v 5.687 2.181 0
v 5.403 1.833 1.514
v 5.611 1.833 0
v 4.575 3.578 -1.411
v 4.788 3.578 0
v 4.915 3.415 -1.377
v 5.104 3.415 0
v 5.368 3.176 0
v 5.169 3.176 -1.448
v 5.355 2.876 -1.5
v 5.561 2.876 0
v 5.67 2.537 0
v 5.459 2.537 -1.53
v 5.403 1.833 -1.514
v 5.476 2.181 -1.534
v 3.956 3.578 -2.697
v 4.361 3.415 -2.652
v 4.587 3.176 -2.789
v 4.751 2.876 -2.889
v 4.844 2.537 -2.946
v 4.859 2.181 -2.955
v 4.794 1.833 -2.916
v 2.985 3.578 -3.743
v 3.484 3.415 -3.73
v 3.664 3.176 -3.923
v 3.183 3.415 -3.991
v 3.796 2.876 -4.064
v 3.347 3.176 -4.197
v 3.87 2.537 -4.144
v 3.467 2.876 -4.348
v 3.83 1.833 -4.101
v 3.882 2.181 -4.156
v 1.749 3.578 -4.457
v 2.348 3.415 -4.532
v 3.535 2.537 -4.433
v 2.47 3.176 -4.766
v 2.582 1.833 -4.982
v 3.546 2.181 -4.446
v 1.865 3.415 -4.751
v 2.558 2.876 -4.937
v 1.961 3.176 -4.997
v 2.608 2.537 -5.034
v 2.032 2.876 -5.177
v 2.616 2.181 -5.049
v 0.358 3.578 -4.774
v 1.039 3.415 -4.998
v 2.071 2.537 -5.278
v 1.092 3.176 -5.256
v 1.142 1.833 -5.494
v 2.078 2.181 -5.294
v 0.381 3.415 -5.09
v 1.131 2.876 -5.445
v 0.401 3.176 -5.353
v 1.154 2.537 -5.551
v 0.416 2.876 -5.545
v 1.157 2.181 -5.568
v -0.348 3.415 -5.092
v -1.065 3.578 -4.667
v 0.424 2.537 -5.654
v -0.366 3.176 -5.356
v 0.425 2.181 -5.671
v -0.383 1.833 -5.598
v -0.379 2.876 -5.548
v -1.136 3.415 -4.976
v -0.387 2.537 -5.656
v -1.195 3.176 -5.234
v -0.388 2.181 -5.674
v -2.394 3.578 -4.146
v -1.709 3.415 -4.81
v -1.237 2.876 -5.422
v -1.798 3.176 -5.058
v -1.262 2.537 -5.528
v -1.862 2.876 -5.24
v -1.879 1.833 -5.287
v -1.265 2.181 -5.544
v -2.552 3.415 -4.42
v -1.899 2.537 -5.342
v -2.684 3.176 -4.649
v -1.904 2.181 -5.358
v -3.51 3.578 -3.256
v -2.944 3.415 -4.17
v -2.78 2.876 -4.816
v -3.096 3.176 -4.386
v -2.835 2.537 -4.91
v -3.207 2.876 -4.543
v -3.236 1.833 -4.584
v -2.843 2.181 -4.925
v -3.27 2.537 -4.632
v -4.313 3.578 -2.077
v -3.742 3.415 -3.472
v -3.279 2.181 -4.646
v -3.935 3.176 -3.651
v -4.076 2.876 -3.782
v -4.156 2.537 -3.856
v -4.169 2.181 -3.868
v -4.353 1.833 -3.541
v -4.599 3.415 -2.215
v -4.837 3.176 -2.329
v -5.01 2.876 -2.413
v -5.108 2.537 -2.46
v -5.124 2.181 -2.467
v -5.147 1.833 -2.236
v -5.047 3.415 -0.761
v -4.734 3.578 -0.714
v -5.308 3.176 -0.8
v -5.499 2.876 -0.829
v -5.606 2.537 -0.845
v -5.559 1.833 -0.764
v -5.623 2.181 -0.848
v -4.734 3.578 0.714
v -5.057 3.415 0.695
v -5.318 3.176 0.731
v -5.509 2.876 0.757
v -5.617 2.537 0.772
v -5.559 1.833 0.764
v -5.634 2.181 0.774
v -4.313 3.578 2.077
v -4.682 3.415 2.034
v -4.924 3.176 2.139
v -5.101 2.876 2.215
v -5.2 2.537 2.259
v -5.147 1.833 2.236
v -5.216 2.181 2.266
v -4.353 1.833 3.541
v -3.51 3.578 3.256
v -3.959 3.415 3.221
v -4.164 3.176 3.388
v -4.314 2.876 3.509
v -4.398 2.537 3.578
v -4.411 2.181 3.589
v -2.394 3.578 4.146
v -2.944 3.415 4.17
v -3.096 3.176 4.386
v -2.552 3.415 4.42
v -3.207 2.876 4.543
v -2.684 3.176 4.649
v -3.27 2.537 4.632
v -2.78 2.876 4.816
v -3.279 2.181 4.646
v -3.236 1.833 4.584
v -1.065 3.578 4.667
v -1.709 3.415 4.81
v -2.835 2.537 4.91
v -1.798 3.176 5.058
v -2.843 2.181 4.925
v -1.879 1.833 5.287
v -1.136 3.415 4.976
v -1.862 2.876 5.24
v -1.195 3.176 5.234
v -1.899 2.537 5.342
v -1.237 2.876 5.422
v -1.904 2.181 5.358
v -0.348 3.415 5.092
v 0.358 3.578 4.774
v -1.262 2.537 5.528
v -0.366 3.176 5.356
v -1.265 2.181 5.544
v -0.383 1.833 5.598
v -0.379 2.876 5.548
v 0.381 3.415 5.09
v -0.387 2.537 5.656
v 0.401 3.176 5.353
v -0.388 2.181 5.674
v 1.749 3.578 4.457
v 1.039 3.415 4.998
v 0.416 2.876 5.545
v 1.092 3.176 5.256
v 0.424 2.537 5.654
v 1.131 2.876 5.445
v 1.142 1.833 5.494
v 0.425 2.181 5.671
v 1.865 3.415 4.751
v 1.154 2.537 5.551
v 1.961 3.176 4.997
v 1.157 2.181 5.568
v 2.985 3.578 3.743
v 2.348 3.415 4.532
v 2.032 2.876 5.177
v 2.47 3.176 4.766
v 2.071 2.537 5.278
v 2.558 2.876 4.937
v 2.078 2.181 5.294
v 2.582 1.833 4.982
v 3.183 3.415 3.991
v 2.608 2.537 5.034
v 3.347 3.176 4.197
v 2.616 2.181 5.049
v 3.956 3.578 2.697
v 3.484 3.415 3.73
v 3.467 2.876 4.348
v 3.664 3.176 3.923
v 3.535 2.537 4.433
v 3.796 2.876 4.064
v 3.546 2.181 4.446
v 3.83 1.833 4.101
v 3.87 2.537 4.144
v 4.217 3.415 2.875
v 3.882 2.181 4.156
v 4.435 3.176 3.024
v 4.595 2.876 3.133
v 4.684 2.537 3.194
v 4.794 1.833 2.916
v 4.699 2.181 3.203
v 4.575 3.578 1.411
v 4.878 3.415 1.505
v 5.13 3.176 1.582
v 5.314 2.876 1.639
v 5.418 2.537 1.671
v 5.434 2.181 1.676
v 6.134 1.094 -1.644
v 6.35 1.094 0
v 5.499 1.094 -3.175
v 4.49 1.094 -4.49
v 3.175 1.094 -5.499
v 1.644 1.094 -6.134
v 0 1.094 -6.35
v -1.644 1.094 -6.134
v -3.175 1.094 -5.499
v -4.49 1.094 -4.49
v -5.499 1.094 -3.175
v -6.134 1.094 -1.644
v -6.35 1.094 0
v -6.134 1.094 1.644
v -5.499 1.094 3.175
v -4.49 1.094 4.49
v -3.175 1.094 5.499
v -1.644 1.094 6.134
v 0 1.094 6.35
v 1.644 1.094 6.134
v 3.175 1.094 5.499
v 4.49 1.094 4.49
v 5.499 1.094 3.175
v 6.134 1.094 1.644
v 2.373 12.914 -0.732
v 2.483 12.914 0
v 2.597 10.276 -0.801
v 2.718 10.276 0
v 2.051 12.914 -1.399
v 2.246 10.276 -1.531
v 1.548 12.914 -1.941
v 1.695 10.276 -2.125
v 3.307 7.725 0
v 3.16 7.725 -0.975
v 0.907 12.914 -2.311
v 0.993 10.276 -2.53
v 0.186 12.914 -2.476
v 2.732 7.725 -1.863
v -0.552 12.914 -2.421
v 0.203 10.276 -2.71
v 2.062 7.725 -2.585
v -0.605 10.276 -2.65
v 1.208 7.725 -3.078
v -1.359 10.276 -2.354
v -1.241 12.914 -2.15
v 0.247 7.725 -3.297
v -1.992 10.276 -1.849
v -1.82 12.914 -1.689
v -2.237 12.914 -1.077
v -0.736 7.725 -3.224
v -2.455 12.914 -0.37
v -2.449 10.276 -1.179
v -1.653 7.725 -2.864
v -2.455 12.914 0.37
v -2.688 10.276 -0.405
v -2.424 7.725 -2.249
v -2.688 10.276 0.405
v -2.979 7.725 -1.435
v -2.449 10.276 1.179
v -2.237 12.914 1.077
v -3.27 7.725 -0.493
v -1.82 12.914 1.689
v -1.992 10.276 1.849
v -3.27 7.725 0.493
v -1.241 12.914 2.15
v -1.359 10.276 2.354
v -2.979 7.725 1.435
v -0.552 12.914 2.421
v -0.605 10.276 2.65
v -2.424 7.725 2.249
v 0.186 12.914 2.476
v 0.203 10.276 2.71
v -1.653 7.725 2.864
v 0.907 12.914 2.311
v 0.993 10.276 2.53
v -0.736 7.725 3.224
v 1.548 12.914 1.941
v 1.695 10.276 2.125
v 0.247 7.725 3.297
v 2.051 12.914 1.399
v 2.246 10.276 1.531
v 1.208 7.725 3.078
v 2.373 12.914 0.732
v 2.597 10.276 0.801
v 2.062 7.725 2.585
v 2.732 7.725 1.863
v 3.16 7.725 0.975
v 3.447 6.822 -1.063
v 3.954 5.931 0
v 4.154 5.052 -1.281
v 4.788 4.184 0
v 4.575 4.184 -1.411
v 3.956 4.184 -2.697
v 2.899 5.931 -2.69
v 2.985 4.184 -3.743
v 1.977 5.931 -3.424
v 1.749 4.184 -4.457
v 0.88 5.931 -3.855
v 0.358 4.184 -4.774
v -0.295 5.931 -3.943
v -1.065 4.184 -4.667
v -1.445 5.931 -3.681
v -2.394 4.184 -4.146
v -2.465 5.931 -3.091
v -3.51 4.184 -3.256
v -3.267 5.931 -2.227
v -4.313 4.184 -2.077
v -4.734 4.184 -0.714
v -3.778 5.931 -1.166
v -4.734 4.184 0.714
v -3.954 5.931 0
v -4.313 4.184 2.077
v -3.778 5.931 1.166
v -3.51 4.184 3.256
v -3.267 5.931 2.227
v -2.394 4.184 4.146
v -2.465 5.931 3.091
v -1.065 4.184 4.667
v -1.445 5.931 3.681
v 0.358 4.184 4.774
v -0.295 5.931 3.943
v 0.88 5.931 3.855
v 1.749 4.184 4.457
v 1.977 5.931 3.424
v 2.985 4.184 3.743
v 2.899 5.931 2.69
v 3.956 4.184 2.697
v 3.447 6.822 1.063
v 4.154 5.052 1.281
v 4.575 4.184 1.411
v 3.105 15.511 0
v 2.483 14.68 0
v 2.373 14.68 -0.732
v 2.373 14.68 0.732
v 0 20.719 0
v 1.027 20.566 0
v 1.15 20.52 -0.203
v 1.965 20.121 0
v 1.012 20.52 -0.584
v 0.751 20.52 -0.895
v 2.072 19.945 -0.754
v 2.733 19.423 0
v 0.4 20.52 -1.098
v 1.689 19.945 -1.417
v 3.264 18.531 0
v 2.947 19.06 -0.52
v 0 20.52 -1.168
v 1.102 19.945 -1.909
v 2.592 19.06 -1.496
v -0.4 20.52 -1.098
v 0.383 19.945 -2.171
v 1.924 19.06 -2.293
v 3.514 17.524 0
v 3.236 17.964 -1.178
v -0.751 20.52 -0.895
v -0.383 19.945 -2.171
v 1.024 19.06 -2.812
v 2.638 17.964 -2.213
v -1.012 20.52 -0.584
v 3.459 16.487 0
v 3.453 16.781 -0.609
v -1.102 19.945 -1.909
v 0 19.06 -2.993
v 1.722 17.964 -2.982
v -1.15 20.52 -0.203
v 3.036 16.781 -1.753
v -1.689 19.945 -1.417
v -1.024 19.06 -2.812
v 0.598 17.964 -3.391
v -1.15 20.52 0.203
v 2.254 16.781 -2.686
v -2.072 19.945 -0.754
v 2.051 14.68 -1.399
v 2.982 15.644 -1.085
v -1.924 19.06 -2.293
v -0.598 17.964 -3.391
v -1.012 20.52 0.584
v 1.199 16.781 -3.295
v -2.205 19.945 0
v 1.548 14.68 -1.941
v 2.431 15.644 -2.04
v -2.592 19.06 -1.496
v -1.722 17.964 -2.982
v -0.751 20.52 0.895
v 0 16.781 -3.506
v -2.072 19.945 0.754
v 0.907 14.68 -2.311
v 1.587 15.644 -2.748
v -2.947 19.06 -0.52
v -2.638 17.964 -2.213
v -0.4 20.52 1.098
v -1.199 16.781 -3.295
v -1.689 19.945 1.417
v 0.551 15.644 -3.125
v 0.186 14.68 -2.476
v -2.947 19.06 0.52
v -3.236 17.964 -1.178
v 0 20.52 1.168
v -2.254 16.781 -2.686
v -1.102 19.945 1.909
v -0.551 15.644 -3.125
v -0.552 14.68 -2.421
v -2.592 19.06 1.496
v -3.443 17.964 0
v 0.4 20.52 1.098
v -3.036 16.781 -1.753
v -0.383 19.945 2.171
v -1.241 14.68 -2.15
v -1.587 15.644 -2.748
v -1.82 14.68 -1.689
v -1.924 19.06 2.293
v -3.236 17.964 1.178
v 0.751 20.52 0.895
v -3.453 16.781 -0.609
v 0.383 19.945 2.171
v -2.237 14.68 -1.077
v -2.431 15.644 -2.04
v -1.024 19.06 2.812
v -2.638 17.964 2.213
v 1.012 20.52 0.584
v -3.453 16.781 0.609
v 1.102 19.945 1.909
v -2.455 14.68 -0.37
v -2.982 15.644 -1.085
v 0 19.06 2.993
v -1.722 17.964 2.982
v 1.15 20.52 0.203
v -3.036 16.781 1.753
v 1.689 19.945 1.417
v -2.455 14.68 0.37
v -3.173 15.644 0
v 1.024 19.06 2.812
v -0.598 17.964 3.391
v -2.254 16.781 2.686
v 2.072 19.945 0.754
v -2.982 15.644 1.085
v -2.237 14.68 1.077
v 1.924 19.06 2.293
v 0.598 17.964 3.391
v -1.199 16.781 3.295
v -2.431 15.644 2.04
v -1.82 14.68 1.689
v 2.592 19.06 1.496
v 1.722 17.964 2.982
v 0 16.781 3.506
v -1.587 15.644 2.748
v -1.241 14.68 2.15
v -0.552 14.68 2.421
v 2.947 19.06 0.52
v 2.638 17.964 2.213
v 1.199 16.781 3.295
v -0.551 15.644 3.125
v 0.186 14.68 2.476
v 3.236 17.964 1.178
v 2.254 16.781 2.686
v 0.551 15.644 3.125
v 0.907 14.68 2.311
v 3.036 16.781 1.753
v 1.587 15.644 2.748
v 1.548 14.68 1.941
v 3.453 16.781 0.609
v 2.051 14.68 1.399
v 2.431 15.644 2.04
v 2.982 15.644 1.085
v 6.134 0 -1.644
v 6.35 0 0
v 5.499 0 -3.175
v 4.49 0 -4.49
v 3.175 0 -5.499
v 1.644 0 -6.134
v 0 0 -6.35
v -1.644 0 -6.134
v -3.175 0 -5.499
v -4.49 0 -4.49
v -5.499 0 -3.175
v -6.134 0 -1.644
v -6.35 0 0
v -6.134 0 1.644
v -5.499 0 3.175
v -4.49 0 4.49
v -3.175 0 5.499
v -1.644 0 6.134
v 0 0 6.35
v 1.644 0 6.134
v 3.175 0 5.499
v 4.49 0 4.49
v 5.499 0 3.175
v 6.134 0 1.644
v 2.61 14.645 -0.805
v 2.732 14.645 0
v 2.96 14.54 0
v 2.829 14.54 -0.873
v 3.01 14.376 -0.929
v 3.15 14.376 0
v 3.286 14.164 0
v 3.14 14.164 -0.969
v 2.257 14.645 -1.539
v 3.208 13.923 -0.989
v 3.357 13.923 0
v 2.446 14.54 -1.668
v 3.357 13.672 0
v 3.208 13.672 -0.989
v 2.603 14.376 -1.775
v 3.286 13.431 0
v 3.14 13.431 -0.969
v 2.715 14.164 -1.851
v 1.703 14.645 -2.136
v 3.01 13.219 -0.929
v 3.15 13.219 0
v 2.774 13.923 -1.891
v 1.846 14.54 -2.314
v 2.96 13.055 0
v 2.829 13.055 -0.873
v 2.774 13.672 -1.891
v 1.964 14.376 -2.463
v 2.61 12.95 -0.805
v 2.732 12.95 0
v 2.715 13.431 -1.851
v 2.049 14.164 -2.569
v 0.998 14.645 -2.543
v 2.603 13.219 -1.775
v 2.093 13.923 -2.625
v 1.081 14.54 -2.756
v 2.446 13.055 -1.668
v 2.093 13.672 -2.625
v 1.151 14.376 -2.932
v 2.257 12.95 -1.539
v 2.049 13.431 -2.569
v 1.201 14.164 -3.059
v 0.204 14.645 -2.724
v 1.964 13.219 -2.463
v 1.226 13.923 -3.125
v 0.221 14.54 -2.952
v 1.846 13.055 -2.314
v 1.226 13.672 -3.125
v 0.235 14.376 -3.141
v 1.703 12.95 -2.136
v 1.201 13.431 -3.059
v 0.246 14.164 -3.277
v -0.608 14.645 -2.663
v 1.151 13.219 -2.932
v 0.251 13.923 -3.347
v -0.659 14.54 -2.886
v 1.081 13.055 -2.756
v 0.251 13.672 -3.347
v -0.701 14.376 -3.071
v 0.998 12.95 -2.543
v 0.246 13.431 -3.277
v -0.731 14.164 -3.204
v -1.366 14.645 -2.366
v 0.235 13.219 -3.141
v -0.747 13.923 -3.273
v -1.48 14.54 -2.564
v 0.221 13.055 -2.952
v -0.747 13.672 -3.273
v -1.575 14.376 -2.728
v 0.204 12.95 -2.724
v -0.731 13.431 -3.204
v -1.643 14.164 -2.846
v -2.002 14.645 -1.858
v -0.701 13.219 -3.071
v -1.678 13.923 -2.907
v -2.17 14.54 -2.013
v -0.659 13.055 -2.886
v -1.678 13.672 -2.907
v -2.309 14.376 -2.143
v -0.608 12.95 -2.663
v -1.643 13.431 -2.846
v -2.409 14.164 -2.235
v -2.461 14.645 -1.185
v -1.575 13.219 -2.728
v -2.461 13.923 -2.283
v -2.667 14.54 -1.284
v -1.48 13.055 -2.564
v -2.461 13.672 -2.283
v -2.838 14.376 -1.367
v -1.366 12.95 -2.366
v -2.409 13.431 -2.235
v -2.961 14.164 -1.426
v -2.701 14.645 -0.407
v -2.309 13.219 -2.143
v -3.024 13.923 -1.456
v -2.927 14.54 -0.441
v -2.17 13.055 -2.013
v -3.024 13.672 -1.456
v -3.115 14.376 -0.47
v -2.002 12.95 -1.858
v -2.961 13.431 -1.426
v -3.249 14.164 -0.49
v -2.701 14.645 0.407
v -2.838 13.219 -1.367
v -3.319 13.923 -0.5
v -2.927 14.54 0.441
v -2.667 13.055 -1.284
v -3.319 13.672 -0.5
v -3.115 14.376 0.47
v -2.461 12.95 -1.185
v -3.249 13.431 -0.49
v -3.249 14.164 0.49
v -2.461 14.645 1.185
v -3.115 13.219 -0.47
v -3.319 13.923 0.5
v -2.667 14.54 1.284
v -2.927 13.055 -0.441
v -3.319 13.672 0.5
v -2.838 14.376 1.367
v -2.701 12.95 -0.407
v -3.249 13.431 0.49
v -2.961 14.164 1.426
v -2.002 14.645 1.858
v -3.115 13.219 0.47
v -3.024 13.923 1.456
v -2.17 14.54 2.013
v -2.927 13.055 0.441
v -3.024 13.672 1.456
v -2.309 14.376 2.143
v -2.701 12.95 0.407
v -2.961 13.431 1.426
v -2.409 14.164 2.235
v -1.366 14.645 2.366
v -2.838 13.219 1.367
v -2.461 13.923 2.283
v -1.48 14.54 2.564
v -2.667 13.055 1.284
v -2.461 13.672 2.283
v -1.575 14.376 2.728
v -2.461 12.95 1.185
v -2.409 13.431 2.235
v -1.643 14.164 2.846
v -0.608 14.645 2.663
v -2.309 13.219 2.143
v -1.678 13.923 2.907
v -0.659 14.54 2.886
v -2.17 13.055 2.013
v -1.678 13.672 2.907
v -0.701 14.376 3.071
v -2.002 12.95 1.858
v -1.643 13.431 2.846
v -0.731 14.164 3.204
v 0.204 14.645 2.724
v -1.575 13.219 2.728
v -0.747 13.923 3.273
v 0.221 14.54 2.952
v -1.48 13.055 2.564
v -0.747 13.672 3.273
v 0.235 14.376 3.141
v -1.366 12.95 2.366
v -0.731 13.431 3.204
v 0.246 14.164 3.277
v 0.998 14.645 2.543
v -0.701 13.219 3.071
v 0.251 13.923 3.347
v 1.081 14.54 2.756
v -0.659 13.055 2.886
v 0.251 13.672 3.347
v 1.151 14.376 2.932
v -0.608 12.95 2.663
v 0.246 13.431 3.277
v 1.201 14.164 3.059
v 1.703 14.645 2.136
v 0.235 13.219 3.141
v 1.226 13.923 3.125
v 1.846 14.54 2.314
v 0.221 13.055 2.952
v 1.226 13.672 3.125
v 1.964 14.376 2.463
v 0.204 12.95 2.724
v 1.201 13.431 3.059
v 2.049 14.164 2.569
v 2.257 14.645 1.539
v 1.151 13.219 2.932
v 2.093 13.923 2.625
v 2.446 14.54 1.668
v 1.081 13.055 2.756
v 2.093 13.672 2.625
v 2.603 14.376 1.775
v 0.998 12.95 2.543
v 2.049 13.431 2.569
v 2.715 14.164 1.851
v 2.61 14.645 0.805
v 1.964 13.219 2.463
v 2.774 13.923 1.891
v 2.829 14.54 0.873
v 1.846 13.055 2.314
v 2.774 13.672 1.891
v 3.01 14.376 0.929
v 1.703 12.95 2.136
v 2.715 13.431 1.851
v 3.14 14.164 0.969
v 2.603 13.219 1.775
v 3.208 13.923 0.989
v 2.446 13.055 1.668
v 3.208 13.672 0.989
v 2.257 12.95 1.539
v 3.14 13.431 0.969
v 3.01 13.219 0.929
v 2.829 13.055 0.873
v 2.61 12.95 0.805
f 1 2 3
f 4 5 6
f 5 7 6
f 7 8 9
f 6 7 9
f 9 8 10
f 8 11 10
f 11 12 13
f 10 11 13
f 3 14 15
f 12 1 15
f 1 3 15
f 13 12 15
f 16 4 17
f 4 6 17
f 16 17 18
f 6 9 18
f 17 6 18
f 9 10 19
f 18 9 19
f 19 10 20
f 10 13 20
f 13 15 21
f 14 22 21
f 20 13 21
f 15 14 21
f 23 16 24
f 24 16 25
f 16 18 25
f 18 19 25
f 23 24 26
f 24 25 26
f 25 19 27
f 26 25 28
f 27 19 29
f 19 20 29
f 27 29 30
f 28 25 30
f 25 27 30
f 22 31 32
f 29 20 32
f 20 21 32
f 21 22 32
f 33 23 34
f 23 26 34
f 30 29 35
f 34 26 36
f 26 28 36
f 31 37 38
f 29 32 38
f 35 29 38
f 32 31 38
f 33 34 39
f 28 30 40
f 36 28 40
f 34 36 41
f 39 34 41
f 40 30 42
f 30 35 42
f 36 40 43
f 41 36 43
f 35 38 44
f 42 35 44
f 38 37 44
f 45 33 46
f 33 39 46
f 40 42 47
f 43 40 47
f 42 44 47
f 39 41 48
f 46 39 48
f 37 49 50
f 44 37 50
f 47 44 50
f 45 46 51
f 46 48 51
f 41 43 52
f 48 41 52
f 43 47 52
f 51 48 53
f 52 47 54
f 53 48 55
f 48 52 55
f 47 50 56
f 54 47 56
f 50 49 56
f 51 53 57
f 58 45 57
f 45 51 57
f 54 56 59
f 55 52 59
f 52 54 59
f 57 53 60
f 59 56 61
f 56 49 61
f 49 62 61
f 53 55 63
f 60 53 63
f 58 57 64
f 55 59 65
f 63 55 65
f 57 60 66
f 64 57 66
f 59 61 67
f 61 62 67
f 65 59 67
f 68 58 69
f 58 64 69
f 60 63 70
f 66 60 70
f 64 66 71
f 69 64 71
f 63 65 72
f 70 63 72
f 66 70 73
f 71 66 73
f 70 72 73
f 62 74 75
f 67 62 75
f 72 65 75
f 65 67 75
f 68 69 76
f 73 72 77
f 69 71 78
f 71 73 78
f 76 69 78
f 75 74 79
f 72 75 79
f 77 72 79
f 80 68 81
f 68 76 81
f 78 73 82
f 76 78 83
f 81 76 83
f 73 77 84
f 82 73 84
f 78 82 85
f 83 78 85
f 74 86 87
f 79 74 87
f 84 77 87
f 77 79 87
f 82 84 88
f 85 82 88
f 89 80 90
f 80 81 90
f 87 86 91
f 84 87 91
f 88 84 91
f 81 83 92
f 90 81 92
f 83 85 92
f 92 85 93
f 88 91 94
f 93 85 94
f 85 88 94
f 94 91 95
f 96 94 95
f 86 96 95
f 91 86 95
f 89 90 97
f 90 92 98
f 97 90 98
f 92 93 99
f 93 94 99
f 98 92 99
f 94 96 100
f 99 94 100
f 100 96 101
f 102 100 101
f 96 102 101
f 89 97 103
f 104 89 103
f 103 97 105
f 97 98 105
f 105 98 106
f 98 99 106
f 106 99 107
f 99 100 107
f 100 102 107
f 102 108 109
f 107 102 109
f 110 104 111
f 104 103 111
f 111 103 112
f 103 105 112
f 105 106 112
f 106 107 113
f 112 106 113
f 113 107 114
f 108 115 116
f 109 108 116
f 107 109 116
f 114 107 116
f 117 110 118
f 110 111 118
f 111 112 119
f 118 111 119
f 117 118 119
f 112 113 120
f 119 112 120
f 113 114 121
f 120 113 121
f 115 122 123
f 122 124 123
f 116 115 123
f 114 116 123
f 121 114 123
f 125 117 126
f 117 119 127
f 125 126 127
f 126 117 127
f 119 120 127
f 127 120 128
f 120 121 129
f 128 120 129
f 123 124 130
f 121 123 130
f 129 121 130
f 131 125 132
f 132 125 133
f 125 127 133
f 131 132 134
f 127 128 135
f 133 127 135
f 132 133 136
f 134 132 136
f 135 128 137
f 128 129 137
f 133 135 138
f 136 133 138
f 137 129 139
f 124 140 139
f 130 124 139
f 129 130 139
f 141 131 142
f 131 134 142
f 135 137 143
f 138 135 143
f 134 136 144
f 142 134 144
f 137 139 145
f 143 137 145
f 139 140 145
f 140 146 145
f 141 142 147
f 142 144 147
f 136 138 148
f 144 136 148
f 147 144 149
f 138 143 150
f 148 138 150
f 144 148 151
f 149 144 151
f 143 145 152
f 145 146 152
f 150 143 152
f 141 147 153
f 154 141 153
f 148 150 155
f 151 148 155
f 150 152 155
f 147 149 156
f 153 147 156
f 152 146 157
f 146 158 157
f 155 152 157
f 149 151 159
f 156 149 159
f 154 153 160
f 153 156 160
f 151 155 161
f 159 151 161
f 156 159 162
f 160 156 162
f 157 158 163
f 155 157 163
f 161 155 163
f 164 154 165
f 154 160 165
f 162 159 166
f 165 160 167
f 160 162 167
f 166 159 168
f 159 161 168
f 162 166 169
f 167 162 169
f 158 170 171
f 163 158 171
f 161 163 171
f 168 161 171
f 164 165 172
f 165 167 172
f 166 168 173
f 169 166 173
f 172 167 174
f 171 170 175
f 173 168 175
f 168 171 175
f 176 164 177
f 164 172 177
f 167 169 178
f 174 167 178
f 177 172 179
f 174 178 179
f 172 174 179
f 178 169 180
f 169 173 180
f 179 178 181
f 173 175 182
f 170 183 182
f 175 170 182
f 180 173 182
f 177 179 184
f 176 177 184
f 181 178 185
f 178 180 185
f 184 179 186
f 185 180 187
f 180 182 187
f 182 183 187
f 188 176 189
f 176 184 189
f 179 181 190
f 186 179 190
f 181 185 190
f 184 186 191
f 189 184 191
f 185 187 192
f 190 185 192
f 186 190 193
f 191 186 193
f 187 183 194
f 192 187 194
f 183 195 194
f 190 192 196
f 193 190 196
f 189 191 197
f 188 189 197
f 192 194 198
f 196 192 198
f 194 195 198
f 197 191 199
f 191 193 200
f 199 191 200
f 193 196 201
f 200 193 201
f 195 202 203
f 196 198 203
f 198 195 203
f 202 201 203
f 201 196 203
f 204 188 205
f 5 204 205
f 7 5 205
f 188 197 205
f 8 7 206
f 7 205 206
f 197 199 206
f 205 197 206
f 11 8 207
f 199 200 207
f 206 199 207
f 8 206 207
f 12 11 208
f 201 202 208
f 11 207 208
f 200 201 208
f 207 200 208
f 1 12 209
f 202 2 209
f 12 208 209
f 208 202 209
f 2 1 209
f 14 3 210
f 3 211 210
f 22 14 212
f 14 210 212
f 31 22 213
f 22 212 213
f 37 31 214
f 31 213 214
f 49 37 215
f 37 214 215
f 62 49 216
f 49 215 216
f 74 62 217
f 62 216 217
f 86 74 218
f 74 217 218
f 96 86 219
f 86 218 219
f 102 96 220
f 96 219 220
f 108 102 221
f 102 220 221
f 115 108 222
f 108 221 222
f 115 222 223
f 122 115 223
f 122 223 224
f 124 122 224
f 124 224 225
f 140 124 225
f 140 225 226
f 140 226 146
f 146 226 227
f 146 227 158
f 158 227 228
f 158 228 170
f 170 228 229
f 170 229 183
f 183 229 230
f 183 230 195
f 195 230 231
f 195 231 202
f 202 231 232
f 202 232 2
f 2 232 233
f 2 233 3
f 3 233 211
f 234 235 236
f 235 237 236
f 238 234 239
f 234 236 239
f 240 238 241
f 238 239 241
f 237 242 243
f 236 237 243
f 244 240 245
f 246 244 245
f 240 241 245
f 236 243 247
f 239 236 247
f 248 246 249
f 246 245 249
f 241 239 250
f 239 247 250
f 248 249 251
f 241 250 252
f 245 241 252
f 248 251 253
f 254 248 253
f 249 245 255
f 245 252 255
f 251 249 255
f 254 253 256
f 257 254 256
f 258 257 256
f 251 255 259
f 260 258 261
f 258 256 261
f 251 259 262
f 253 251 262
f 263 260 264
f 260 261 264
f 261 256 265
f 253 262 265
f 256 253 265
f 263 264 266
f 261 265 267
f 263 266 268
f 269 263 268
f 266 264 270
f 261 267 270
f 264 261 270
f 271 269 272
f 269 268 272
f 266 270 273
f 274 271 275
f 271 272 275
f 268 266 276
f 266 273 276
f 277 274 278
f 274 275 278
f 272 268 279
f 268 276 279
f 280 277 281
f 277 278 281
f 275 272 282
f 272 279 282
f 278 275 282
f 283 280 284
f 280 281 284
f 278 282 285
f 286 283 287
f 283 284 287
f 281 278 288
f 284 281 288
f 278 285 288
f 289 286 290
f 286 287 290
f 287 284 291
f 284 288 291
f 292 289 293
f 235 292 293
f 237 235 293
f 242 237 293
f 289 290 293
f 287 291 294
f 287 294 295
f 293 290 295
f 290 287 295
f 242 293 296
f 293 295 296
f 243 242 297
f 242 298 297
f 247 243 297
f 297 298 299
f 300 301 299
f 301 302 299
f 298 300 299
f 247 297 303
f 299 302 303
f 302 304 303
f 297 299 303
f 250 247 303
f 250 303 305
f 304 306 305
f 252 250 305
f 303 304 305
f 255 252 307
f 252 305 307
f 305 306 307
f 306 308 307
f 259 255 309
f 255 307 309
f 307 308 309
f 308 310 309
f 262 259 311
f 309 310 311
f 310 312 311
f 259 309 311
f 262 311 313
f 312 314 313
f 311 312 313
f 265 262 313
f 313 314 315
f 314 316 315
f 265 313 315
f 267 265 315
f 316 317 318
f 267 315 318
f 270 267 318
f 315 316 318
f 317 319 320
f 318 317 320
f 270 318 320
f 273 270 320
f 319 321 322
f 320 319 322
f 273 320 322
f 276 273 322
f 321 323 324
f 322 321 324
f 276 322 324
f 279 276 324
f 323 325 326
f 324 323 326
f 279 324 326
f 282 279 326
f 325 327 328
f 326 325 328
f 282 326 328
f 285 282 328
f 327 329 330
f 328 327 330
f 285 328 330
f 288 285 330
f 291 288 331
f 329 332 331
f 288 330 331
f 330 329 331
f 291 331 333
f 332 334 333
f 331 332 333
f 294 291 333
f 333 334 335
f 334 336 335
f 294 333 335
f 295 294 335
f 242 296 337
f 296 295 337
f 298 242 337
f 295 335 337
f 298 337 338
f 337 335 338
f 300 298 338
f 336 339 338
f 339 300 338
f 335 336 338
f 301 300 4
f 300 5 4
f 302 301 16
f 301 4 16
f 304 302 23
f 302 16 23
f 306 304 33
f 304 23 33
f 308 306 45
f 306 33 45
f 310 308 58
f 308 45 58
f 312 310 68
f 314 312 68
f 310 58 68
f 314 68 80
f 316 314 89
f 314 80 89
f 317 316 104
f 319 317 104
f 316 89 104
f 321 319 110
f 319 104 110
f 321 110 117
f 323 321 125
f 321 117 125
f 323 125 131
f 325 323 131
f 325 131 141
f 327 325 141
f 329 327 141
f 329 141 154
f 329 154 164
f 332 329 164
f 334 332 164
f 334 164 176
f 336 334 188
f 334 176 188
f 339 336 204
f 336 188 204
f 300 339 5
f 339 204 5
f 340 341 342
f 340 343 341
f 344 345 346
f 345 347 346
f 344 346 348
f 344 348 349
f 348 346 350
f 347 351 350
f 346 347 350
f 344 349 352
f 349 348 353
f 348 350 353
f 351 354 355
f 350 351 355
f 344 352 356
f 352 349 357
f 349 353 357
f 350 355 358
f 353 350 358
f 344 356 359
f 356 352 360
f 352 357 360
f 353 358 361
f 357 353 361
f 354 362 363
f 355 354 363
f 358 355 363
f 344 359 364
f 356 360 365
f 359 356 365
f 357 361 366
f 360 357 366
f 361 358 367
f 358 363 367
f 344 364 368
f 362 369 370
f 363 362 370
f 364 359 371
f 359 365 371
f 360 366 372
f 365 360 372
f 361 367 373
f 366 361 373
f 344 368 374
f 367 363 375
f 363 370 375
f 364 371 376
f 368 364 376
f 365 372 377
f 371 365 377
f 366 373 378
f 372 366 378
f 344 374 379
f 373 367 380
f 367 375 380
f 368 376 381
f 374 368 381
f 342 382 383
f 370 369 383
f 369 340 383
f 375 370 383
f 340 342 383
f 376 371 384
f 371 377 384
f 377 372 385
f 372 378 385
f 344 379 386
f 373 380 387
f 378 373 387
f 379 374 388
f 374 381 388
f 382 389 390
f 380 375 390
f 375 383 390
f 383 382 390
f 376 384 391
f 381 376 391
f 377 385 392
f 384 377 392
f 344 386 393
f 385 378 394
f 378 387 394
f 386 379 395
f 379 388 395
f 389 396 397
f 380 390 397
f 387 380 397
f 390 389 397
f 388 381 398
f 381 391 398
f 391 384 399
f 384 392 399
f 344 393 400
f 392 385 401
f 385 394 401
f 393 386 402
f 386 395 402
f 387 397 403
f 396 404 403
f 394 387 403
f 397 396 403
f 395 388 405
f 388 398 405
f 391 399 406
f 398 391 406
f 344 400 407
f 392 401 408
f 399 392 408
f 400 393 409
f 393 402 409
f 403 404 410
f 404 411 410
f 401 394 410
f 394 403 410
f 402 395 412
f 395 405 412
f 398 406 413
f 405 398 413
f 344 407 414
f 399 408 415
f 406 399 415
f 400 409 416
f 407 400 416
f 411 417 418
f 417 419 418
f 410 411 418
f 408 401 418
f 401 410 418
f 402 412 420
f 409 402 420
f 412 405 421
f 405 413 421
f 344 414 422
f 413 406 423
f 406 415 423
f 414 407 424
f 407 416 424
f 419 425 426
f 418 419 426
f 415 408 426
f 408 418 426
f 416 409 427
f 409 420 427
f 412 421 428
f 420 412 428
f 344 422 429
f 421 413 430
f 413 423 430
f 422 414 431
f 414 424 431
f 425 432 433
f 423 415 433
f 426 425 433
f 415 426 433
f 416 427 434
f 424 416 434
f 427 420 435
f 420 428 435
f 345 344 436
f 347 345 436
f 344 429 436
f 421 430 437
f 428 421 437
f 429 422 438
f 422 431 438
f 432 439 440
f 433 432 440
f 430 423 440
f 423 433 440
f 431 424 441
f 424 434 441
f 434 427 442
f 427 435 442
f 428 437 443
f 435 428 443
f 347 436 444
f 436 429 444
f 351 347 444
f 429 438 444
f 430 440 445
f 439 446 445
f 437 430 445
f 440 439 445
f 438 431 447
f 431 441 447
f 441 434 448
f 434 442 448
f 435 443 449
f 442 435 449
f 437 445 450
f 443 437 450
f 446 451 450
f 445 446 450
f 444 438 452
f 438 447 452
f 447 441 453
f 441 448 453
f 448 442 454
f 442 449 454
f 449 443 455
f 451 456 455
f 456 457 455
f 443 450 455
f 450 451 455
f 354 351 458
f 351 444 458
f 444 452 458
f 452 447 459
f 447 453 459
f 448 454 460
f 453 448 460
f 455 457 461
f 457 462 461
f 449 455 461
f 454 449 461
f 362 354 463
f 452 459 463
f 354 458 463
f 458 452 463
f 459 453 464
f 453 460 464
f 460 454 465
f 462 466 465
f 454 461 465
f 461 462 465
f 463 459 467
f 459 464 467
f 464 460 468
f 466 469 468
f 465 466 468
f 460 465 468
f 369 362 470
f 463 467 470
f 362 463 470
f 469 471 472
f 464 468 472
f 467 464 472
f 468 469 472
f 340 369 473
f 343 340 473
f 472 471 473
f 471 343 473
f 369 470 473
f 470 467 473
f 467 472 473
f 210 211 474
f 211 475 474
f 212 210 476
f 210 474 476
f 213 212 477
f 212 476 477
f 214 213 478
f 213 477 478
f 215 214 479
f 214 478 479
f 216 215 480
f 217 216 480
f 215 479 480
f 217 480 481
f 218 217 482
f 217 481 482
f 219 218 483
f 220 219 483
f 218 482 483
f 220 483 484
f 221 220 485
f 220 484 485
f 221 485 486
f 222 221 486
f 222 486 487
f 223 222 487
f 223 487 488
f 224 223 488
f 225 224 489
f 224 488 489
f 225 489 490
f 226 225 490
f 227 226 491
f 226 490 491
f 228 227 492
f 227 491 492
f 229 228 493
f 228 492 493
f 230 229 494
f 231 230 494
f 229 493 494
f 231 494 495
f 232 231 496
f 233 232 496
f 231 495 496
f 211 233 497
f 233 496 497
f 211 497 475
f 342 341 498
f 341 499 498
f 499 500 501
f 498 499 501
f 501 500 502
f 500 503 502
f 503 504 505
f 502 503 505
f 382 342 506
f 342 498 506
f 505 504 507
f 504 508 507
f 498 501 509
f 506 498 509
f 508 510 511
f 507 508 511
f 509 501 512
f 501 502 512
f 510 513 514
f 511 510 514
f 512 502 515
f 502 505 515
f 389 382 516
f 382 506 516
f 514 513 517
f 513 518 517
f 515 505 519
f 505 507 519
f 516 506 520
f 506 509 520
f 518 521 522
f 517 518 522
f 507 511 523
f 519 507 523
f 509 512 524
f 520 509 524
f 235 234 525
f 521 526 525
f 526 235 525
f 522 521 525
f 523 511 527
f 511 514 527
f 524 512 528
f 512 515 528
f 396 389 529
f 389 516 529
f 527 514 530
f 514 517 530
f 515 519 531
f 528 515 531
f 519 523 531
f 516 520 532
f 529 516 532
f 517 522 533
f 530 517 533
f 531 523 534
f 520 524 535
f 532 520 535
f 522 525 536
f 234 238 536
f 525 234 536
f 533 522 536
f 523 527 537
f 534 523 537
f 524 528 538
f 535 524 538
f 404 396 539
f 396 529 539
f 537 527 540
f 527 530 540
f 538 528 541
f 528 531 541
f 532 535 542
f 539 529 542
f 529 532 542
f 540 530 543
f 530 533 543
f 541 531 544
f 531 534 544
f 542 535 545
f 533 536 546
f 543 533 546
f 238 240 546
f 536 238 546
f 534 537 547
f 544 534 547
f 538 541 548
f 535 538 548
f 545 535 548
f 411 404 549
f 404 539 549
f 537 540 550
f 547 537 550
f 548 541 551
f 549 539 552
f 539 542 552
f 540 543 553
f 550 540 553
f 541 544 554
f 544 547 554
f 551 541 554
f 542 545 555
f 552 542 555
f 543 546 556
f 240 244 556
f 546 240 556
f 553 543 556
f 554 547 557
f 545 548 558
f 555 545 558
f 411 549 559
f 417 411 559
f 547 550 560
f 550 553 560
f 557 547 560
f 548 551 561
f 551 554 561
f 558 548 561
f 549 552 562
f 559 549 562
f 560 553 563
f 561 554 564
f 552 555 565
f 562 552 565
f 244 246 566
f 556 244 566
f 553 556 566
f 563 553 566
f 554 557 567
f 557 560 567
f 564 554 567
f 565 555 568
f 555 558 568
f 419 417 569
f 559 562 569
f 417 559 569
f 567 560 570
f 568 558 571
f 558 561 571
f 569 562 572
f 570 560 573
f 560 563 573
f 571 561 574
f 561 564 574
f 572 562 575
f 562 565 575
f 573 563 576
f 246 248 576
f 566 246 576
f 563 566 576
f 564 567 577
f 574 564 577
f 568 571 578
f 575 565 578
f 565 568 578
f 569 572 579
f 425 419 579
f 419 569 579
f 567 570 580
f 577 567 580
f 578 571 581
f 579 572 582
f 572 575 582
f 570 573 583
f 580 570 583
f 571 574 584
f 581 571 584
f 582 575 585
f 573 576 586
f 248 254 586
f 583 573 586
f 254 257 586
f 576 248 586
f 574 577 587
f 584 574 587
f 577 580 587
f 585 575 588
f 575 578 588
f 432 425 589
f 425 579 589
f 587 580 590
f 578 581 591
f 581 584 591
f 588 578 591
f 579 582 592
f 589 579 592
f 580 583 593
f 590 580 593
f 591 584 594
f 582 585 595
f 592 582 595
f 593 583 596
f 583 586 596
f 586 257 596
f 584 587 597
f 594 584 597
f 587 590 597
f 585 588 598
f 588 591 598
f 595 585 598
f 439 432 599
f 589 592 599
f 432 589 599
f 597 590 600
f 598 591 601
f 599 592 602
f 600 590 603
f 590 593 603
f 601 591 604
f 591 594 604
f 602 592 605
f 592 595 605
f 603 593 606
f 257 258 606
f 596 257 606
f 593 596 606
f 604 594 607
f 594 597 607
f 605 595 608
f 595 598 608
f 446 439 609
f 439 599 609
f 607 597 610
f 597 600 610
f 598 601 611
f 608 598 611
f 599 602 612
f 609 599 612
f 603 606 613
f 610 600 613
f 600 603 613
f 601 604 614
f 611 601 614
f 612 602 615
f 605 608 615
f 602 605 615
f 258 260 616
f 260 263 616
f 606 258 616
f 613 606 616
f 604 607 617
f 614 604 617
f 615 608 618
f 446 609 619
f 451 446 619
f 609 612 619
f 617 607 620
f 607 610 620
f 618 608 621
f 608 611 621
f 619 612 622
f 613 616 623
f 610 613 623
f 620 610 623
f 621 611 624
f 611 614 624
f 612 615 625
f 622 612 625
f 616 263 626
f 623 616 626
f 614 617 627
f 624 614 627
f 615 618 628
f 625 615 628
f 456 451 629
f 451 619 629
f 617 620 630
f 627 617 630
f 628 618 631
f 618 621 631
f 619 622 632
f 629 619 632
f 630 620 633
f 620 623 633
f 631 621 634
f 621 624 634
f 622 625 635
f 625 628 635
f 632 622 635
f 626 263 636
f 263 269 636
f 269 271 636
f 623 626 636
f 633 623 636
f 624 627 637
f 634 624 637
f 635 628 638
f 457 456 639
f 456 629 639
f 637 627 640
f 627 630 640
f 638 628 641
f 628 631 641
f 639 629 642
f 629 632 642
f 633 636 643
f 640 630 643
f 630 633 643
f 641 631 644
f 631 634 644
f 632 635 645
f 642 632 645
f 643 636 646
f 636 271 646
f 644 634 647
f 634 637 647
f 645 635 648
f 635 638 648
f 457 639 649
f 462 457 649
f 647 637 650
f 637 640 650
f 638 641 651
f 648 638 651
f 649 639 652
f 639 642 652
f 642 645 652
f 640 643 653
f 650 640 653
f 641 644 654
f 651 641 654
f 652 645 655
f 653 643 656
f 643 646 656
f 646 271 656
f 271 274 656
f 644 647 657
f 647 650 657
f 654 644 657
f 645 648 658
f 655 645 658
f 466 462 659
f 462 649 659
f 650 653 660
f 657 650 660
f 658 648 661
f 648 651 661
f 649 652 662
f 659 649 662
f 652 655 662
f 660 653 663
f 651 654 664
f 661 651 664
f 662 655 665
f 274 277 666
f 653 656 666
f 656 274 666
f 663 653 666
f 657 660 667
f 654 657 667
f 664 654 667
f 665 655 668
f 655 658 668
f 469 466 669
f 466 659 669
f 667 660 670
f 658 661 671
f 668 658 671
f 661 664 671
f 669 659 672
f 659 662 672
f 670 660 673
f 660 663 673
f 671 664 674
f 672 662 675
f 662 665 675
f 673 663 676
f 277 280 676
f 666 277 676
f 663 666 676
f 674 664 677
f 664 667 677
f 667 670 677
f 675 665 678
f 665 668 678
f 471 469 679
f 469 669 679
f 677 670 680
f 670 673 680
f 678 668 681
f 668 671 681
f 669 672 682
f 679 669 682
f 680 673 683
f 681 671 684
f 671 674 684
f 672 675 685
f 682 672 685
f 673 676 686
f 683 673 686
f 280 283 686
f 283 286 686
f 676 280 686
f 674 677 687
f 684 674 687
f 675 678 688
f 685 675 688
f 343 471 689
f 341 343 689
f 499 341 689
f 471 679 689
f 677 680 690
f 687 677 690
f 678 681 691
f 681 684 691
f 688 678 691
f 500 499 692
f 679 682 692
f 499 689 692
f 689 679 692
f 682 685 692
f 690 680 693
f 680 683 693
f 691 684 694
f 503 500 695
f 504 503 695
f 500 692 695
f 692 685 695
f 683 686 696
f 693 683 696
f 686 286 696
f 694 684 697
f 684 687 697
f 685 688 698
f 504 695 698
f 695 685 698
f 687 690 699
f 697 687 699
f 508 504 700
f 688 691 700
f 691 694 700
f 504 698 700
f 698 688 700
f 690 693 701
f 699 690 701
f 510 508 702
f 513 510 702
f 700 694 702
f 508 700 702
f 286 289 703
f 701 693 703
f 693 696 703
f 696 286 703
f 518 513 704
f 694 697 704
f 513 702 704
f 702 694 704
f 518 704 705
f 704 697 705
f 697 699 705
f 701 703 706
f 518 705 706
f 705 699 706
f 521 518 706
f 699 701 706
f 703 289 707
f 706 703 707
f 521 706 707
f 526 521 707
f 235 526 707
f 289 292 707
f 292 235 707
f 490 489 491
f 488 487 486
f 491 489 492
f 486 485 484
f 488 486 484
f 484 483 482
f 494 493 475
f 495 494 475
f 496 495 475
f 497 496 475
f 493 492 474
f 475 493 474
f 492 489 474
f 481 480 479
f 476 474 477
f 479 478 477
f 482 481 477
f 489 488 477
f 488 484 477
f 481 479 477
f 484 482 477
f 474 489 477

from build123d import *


with BuildPart() as part:
    # Sketch1 → Revolve4 (revolve)
    with BuildSketch(Plane.XY):
        with BuildLine():
            Line((0, 0), (0, 20.718792279))
            ThreePointArc((0, 20.718792279), (3.264480019, 18.531398873), (2.482849316, 14.680350555))
            ThreePointArc((2.482849316, 14.680350555), (3.365856417, 13.797343455), (2.482849316, 12.914336354))
            add(Edge.make_bspline(
                [(2.482849316, 12.914336354), (2.583418025, 8.286863587), (4.787525553, 4.183965741)],
                knots=[0, 0, 0, 1, 1, 1], degree=2))
            Line((4.787525553, 4.183965741), (4.787525553, 3.578409965))
            ThreePointArc((4.787525553, 3.578409965), (5.560964983, 2.876116424), (5.611272713, 1.832615632))
            Line((5.611272713, 1.832615632), (6.35, 1.093888345))
            Line((6.35, 1.093888345), (6.35, 0))
            Line((6.35, 0), (0, 0))
        make_face()
    revolve(axis=Axis((0, 0, 0), (0, 1, 0)))


solid = part.part
